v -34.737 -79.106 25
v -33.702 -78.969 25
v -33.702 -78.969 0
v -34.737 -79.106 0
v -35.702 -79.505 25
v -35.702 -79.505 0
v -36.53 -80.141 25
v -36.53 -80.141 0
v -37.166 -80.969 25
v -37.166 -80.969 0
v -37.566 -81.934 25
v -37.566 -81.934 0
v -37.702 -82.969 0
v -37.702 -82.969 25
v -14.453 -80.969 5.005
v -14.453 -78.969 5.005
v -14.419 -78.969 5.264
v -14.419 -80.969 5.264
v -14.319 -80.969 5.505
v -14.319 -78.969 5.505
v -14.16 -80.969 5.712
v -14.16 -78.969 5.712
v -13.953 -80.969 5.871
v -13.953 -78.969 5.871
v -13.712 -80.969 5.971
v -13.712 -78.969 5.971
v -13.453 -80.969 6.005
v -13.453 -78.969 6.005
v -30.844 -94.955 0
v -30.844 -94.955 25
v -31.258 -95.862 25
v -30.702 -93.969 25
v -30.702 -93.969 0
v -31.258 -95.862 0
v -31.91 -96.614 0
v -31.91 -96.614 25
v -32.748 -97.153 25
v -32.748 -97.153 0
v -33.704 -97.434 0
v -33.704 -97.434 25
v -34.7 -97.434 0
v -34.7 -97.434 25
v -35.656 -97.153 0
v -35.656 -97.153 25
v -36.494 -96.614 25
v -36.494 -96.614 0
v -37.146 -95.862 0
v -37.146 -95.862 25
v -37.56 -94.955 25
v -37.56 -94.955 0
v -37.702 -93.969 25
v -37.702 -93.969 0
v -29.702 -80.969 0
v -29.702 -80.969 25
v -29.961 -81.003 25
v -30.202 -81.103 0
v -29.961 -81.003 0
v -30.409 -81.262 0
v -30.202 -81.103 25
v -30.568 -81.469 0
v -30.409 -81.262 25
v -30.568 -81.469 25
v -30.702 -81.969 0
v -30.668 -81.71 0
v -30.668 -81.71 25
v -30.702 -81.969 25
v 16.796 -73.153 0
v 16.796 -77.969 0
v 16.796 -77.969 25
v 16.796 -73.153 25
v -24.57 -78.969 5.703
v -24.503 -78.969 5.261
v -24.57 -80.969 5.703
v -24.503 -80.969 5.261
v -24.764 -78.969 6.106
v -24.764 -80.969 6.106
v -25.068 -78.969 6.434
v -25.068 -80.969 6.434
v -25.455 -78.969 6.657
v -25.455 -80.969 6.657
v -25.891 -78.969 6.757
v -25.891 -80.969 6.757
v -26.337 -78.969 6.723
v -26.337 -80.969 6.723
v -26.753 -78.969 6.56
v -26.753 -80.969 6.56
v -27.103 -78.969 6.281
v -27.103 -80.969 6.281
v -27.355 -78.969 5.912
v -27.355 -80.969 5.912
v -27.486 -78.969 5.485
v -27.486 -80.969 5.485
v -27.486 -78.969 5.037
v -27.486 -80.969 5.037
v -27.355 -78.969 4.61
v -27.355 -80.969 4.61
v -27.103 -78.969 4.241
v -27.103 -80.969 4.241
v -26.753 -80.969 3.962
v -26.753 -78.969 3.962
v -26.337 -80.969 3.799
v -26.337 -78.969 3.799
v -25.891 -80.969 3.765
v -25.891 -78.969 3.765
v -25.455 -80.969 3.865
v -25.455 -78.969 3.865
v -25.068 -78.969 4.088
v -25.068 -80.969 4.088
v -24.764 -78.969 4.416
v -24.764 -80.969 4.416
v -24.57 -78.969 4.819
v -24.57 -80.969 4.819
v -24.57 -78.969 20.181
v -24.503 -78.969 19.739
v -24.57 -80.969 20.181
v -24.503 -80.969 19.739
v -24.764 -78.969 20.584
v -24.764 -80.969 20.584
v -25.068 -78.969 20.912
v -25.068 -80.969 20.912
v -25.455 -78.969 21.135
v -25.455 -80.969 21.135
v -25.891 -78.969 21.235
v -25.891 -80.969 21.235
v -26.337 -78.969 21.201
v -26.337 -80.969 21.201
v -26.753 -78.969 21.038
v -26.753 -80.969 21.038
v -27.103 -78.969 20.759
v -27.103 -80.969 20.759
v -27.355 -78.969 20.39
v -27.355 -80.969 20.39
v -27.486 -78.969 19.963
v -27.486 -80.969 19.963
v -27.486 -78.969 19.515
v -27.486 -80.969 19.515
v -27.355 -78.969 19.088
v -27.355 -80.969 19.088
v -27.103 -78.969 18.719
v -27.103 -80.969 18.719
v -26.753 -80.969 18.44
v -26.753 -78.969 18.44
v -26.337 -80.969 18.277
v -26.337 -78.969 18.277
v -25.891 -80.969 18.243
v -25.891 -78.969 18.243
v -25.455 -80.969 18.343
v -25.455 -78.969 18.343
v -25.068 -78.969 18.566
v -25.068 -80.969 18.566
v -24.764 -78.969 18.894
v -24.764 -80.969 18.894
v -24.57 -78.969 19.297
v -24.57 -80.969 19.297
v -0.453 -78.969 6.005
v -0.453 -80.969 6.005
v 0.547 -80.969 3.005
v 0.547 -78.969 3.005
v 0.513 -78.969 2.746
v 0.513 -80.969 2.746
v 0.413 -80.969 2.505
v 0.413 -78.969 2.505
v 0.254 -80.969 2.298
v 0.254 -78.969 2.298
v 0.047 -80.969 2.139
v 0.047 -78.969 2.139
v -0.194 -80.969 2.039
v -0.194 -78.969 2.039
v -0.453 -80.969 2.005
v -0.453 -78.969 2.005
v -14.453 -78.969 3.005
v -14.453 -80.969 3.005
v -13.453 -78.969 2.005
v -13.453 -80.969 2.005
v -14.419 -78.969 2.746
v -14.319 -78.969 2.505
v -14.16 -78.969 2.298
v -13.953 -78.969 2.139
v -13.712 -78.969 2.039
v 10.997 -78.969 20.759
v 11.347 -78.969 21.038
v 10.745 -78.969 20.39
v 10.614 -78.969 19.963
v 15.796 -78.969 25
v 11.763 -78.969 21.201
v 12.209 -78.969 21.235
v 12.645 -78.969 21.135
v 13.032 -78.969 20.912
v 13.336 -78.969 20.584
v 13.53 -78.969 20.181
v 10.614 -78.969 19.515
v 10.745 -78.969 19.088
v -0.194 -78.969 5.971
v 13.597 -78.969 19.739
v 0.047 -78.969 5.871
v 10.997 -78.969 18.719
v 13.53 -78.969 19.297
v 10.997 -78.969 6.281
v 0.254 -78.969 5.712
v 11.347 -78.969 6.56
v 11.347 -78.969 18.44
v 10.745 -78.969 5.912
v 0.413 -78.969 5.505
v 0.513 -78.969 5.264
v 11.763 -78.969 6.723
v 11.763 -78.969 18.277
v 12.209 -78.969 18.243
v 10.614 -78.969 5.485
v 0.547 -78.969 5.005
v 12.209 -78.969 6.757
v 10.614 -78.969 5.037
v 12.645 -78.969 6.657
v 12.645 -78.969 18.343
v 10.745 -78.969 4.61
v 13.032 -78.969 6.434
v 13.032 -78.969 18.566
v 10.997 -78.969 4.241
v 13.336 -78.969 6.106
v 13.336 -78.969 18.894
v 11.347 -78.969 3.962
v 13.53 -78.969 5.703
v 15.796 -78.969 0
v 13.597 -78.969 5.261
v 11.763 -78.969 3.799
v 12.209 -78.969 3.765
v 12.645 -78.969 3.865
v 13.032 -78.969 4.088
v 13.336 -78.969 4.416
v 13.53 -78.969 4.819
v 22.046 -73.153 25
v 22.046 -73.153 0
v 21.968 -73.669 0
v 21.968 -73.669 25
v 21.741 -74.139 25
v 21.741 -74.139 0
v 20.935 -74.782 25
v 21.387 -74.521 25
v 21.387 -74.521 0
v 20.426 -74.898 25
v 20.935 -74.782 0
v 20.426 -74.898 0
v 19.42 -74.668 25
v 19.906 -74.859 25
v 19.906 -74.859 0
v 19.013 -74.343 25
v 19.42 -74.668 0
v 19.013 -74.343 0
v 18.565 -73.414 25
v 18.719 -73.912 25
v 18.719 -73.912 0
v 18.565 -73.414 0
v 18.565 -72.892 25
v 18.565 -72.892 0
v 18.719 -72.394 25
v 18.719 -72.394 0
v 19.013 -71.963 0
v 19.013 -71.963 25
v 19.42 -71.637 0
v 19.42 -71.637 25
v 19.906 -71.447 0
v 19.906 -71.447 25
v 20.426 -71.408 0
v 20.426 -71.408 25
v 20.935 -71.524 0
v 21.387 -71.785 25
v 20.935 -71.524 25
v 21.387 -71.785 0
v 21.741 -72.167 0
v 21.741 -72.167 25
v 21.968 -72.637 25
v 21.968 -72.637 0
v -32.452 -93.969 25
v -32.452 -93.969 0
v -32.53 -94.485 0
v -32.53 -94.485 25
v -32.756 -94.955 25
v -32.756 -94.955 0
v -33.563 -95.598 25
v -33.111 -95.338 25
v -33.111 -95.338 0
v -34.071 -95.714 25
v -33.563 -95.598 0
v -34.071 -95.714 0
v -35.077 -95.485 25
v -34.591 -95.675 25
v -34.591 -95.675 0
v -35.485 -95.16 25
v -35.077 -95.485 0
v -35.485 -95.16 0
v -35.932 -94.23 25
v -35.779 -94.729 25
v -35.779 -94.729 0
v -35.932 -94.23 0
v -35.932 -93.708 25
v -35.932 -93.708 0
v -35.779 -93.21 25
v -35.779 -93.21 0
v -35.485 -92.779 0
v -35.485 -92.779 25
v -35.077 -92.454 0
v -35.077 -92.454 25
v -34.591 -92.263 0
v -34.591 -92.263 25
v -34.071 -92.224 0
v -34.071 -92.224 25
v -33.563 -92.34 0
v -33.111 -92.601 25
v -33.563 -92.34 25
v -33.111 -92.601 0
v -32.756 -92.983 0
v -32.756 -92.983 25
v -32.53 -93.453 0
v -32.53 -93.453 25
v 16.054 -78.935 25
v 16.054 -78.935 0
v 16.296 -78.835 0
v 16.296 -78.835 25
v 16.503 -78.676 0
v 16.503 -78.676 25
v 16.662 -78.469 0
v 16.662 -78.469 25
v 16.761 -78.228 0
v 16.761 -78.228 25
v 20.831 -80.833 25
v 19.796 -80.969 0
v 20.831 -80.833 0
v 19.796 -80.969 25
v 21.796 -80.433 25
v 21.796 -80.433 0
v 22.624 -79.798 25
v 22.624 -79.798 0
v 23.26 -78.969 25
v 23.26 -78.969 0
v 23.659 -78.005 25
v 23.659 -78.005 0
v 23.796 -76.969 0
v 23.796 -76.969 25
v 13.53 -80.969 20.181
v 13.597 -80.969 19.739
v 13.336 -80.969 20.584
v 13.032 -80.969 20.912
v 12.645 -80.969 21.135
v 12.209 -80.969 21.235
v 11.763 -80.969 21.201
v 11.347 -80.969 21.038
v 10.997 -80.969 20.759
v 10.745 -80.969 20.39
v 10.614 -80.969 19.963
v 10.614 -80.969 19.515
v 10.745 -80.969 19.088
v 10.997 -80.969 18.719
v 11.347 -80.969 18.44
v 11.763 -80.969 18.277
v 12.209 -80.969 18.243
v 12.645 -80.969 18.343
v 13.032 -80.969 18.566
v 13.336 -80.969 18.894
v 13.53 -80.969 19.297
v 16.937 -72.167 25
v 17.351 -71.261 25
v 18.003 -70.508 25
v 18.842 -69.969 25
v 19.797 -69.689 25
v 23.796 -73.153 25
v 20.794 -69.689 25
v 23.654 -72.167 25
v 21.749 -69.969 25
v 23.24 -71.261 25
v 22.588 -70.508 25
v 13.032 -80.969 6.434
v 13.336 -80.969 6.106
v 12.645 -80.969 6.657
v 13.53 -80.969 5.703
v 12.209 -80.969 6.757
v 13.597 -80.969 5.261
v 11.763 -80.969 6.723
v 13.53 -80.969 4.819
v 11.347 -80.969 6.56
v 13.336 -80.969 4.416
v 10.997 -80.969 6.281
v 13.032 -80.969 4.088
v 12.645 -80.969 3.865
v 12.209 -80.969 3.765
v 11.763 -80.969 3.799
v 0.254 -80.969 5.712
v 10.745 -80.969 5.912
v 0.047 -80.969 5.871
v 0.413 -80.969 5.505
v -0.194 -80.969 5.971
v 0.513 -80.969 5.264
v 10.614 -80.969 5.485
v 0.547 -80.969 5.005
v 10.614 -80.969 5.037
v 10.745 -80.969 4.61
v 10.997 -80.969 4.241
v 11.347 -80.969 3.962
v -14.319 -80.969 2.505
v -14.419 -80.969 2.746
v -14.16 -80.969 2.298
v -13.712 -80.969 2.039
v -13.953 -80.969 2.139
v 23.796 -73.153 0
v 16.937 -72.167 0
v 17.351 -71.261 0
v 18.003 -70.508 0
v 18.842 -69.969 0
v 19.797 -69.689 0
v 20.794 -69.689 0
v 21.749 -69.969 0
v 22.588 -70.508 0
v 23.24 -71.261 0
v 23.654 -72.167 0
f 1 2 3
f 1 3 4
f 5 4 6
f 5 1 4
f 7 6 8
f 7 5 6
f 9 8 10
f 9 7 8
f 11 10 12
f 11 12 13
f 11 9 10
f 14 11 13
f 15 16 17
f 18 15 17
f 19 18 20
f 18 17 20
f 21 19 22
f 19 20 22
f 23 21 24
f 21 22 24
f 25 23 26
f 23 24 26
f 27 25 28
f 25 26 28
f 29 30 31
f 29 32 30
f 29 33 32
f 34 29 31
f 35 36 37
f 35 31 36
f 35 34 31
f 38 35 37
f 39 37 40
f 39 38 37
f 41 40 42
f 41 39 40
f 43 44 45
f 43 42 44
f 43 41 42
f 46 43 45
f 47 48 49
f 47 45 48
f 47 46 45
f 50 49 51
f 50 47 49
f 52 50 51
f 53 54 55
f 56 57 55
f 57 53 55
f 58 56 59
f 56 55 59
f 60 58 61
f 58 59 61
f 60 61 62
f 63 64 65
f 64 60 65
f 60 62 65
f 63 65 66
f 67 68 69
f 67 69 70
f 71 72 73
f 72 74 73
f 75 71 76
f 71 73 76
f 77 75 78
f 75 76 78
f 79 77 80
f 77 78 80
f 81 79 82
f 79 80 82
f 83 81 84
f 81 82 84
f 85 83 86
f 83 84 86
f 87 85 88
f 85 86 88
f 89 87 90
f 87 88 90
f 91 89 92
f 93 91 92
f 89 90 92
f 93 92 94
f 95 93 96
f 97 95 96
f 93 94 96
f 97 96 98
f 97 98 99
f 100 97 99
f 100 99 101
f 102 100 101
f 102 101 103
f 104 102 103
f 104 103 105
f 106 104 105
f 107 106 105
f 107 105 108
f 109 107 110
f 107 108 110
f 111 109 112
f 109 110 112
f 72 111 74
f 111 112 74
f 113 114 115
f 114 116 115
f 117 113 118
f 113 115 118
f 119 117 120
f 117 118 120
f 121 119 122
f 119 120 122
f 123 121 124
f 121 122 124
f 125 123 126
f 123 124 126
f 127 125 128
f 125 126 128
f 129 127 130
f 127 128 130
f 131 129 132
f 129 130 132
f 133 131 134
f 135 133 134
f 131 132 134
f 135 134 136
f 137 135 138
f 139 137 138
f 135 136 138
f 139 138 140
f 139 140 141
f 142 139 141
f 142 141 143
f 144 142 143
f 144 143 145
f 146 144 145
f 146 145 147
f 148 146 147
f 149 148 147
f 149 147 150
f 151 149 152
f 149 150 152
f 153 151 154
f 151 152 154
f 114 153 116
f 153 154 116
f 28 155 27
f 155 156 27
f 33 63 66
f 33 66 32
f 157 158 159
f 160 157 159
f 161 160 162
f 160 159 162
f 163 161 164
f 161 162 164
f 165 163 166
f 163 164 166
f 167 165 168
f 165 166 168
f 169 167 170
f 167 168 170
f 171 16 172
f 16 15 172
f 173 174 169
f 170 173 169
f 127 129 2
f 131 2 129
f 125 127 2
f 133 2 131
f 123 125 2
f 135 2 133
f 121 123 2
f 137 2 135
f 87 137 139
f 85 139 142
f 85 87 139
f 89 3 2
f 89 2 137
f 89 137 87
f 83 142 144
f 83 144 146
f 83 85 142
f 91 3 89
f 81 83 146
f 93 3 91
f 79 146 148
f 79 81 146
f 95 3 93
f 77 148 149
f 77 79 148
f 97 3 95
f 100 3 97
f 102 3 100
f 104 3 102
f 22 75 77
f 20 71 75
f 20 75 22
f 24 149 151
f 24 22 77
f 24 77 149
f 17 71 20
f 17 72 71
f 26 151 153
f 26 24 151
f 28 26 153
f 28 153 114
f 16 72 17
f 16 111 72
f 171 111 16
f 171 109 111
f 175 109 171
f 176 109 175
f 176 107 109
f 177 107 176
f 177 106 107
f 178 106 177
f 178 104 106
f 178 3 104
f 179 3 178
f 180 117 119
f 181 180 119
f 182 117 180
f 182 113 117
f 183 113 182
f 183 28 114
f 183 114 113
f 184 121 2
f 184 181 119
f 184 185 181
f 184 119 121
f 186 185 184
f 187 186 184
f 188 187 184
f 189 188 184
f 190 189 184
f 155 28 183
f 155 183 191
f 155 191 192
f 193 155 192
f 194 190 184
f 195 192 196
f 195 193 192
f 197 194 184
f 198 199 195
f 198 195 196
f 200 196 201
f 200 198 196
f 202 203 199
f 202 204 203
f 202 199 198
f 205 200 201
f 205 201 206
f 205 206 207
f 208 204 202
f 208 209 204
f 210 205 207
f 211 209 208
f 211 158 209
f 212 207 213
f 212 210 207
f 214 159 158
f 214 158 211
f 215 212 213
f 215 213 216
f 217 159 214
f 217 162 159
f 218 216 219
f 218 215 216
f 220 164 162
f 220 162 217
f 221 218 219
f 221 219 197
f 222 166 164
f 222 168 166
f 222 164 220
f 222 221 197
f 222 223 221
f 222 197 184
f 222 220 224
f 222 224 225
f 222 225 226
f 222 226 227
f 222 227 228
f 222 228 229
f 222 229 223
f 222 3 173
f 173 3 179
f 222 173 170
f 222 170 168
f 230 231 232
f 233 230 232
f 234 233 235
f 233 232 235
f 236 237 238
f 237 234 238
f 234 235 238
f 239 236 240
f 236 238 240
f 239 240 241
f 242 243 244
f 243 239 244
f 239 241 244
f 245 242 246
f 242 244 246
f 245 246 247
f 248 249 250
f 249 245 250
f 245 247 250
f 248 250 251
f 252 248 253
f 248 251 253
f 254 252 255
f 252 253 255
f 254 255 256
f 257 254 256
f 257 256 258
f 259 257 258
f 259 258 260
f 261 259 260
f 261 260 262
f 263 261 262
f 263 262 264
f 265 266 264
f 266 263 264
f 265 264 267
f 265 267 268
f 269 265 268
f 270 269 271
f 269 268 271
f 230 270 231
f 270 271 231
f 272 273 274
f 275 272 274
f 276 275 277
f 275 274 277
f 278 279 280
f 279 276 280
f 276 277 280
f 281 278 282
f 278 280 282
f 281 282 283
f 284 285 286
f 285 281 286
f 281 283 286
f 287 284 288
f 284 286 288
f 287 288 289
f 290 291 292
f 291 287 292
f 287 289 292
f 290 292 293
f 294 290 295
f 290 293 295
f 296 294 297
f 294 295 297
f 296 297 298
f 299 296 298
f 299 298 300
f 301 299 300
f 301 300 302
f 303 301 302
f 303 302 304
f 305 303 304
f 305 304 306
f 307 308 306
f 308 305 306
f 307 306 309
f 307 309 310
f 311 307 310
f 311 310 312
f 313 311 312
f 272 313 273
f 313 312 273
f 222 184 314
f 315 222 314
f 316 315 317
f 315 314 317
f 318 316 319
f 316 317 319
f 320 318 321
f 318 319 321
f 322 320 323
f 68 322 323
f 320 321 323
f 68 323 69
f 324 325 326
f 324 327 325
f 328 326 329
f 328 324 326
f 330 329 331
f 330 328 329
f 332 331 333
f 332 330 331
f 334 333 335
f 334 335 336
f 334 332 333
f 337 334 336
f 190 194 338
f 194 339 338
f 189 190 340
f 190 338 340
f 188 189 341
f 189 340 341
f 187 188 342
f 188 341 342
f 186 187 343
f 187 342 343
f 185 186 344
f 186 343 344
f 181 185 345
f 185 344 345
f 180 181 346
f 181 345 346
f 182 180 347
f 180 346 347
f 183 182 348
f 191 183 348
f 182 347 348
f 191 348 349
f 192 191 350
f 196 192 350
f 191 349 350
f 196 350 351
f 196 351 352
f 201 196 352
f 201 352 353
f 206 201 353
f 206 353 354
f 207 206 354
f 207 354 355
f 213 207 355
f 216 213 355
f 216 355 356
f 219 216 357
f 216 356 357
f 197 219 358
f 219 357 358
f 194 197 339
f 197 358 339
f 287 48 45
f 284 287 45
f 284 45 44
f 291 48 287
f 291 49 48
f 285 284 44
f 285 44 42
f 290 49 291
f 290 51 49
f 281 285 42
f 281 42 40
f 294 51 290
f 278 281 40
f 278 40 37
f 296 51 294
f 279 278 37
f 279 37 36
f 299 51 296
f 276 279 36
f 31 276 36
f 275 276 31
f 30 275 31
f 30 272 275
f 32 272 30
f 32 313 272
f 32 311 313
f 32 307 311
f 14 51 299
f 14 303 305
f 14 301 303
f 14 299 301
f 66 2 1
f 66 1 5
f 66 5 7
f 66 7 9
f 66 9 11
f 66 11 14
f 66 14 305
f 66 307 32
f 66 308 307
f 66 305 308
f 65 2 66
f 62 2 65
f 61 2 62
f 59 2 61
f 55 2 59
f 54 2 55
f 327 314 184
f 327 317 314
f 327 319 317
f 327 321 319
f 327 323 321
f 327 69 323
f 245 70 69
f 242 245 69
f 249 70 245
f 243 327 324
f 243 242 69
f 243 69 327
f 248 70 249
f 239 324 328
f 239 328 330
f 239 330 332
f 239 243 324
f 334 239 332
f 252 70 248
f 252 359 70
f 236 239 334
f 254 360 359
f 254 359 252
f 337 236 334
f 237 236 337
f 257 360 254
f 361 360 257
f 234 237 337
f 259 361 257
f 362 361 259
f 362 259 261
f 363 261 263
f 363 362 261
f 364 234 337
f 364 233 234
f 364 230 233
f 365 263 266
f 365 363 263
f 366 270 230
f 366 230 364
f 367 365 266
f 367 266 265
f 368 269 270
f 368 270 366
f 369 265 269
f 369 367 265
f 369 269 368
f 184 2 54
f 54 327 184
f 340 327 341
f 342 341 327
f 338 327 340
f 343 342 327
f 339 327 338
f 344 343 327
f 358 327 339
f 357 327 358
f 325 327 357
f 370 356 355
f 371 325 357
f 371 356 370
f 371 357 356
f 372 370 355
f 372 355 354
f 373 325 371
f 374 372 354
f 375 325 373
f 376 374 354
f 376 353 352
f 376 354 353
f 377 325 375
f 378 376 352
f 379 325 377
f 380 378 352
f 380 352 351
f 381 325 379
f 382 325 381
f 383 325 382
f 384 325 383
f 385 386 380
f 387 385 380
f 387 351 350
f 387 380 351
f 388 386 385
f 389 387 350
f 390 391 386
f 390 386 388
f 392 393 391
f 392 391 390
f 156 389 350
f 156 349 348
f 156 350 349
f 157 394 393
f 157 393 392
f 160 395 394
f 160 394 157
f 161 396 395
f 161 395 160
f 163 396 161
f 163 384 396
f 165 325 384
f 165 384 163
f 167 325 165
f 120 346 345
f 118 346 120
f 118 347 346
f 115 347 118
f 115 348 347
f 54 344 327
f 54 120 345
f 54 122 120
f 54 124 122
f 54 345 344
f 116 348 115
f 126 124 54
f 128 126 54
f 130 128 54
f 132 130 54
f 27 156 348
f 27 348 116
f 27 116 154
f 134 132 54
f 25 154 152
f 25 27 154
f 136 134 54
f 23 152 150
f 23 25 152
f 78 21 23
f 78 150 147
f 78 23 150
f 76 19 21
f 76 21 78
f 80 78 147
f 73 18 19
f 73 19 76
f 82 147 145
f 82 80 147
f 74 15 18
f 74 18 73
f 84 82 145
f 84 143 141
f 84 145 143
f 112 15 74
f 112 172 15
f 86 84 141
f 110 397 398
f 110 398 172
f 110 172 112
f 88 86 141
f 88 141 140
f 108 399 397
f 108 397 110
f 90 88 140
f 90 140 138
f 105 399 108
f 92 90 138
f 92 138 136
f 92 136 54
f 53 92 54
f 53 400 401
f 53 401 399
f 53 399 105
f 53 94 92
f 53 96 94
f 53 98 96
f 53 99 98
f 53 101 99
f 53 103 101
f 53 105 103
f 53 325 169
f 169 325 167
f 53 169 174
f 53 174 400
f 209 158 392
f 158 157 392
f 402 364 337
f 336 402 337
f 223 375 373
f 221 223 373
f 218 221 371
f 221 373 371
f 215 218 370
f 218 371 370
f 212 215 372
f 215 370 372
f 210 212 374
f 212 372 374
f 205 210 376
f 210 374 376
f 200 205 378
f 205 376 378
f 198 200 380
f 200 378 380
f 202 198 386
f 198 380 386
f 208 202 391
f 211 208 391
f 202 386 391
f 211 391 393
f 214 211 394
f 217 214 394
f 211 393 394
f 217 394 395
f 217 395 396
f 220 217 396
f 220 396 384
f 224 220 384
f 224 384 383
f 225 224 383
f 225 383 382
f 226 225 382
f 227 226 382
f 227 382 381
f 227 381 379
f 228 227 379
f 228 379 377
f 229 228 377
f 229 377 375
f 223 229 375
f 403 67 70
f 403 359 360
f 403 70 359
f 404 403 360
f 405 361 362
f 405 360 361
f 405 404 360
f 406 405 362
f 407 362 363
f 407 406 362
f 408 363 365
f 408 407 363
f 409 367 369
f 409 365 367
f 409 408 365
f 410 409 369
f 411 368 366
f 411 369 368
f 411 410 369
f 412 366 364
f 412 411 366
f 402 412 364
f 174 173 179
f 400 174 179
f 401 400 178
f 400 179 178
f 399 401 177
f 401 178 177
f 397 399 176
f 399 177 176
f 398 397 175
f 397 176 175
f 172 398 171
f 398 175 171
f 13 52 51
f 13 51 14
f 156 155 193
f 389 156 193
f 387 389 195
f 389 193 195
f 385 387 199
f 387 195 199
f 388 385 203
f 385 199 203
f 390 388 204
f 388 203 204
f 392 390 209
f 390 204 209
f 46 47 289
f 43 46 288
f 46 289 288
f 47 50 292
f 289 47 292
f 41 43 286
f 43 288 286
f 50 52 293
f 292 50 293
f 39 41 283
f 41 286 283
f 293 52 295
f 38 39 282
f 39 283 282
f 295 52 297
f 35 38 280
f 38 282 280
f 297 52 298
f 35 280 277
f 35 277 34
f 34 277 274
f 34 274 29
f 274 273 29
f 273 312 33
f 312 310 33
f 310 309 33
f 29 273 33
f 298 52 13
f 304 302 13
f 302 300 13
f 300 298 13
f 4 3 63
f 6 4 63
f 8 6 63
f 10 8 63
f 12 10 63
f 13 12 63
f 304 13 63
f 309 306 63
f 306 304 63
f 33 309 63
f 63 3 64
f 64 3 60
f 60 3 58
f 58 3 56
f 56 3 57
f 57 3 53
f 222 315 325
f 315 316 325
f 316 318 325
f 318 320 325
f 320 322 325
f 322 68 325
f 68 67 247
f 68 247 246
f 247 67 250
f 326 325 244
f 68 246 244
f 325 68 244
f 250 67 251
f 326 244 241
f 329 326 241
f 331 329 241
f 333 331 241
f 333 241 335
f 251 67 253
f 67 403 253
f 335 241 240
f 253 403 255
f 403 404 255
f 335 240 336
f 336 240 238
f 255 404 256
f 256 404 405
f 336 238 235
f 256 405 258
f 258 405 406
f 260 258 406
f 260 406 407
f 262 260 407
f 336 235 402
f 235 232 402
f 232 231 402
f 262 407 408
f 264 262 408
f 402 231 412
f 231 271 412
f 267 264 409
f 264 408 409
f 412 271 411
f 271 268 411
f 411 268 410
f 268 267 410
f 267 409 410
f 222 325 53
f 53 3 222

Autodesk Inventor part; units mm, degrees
ref_plane "YZ Plane" through (0, 0, 0) normal (1, 0, 0) x (0, 1, 0)
ref_plane "XZ Plane" through (0, 0, 0) normal (0, 1, 0) x (-1, 0, 0)
ref_plane "XY Plane" through (0, 0, 0) normal (0, 0, 1) x (1, 0, 0)
sketch "Skizze2" plane through (0, 0, 0) normal (0, 0, 1) x (1, 0, 0)
  line L0 (0, 0) -> (36.75, -63.6529) construction
  line L1 (0, 0) -> (73.5, 0) construction
  line L2 (36.75, -63.6529) -> (20.2955, -73.1529) construction
  line L3 (0, 0) -> (-34.202, -93.9693) construction
  line L4 (0, 0) -> (100, 0) construction
  circle A0 centre (-34.202, -93.9693) radius 1.75
  circle A1 centre (20.2955, -73.1529) radius 1.75
  arc A2 (-37.702, -93.9693) -> (-30.702, -93.9693) centre (-34.202, -93.9693) ccw
  arc A3 (23.7955, -73.1529) -> (16.7955, -73.1529) centre (20.2955, -73.1529) ccw
  line L5 (-37.702, -93.9693) -> (-37.702, -78.9693)
  line L6 (-37.702, -78.9693) -> (16.7955, -78.9693)
  line L7 (16.7955, -78.9693) -> (16.7955, -73.1529)
  line L8 (23.7955, -73.1529) -> (23.7955, -80.9693)
  line L9 (23.7955, -80.9693) -> (-30.702, -80.9693)
  line L10 (-30.702, -80.9693) -> (-30.702, -93.9693)
  line L11 (-30.702, -93.9693) -> (-37.702, -93.9693) construction
  line L12 (16.7955, -73.1529) -> (23.7955, -73.1529) construction
  dimension "d16" = 73.5
  dimension "d17" = 60
  dimension "d18" = 19
  dimension "d19" = 100
  dimension "d20" = 110
  dimension "d21" = 3.5
  dimension "d22" = 7
  dimension "d23" = 2
  dimension "d24" = 13
extrude "Extrusion2" add sketch "Skizze2" along normal blind 25
sketch "Skizze3" plane through (-30.702, -80.9693, 0) normal (0, -1, 0) x (1, 0, 0)
  line L0 (4.6988, 19.739) -> (42.7988, 19.739) construction
  line L1 (42.7988, 19.739) -> (42.7988, 5.261) construction
  line L2 (42.7988, 5.261) -> (4.6988, 5.261) construction
  line L3 (4.6988, 5.261) -> (4.6988, 19.739) construction
  line L4 (0, 0) -> (0, 25) construction
  line L5 (0, 12.5) -> (47.4975, 12.5) construction
  line L6 (47.4975, 0) -> (47.4975, 25) construction
  line L7 (0, 25) -> (54.4975, 25) construction
  line L8 (23.7488, 25) -> (23.7488, 0) construction
  line L9 (0, 0) -> (54.4975, 0) construction
  circle A0 centre (42.7988, 19.739) radius 1.5
  circle A1 centre (4.6988, 5.261) radius 1.5
  line L10 (2.1588, 22.4949) -> (45.3388, 22.4949) construction
  line L11 (45.3388, 22.4949) -> (45.3388, 2.5051) construction
  line L12 (45.3388, 2.5051) -> (2.1588, 2.5051) construction
  line L13 (2.1588, 2.5051) -> (2.1588, 22.4949) construction
  line L14 (16.2488, 2.0051) -> (31.2488, 2.0051)
  line L15 (31.2488, 2.0051) -> (31.2488, 6.0051)
  line L16 (31.2488, 6.0051) -> (16.2488, 6.0051)
  line L17 (16.2488, 6.0051) -> (16.2488, 2.0051)
  circle A2 centre (4.6988, 19.739) radius 1.5
  circle A3 centre (42.7988, 5.261) radius 1.5
  point P0 (30.702, 0)
  point P1 (23.7488, 12.5)
  point P2 (23.7488, 19.739)
  point P3 (42.7988, 12.5)
  point P4 (23.7488, 22.4949)
  point P5 (45.3388, 12.5)
  point P6 (23.7488, 6.0051)
  dimension "d27" = 38.1
  dimension "d28" = 14.478
  dimension "d29" = 3
  dimension "d30" = 43.18
  dimension "d31" = 19.9898
  dimension "d32" = 15
  dimension "d33" = 4
  dimension "d39" = 0.5
extrude "Extrusion3" cut sketch "Skizze3" against normal up to next
fillet "Rundung1" radius 1 4 edges at (-14.4532, -79.9693, 2.0051) (-14.4532, -79.9693, 6.0051) (0.5468, -79.9693, 2.0051) (0.5468, -79.9693, 6.0051)
fillet "Rundung2" radius 4 2 edges at (23.7955, -80.9693, 12.5) (-37.702, -78.9693, 12.5)
fillet "Rundung3" radius 1 2 edges at (16.7955, -78.9693, 12.5) (-30.702, -80.9693, 12.5)
properties part number "US Halterung rechts" material "ABS-Kunststoff"
